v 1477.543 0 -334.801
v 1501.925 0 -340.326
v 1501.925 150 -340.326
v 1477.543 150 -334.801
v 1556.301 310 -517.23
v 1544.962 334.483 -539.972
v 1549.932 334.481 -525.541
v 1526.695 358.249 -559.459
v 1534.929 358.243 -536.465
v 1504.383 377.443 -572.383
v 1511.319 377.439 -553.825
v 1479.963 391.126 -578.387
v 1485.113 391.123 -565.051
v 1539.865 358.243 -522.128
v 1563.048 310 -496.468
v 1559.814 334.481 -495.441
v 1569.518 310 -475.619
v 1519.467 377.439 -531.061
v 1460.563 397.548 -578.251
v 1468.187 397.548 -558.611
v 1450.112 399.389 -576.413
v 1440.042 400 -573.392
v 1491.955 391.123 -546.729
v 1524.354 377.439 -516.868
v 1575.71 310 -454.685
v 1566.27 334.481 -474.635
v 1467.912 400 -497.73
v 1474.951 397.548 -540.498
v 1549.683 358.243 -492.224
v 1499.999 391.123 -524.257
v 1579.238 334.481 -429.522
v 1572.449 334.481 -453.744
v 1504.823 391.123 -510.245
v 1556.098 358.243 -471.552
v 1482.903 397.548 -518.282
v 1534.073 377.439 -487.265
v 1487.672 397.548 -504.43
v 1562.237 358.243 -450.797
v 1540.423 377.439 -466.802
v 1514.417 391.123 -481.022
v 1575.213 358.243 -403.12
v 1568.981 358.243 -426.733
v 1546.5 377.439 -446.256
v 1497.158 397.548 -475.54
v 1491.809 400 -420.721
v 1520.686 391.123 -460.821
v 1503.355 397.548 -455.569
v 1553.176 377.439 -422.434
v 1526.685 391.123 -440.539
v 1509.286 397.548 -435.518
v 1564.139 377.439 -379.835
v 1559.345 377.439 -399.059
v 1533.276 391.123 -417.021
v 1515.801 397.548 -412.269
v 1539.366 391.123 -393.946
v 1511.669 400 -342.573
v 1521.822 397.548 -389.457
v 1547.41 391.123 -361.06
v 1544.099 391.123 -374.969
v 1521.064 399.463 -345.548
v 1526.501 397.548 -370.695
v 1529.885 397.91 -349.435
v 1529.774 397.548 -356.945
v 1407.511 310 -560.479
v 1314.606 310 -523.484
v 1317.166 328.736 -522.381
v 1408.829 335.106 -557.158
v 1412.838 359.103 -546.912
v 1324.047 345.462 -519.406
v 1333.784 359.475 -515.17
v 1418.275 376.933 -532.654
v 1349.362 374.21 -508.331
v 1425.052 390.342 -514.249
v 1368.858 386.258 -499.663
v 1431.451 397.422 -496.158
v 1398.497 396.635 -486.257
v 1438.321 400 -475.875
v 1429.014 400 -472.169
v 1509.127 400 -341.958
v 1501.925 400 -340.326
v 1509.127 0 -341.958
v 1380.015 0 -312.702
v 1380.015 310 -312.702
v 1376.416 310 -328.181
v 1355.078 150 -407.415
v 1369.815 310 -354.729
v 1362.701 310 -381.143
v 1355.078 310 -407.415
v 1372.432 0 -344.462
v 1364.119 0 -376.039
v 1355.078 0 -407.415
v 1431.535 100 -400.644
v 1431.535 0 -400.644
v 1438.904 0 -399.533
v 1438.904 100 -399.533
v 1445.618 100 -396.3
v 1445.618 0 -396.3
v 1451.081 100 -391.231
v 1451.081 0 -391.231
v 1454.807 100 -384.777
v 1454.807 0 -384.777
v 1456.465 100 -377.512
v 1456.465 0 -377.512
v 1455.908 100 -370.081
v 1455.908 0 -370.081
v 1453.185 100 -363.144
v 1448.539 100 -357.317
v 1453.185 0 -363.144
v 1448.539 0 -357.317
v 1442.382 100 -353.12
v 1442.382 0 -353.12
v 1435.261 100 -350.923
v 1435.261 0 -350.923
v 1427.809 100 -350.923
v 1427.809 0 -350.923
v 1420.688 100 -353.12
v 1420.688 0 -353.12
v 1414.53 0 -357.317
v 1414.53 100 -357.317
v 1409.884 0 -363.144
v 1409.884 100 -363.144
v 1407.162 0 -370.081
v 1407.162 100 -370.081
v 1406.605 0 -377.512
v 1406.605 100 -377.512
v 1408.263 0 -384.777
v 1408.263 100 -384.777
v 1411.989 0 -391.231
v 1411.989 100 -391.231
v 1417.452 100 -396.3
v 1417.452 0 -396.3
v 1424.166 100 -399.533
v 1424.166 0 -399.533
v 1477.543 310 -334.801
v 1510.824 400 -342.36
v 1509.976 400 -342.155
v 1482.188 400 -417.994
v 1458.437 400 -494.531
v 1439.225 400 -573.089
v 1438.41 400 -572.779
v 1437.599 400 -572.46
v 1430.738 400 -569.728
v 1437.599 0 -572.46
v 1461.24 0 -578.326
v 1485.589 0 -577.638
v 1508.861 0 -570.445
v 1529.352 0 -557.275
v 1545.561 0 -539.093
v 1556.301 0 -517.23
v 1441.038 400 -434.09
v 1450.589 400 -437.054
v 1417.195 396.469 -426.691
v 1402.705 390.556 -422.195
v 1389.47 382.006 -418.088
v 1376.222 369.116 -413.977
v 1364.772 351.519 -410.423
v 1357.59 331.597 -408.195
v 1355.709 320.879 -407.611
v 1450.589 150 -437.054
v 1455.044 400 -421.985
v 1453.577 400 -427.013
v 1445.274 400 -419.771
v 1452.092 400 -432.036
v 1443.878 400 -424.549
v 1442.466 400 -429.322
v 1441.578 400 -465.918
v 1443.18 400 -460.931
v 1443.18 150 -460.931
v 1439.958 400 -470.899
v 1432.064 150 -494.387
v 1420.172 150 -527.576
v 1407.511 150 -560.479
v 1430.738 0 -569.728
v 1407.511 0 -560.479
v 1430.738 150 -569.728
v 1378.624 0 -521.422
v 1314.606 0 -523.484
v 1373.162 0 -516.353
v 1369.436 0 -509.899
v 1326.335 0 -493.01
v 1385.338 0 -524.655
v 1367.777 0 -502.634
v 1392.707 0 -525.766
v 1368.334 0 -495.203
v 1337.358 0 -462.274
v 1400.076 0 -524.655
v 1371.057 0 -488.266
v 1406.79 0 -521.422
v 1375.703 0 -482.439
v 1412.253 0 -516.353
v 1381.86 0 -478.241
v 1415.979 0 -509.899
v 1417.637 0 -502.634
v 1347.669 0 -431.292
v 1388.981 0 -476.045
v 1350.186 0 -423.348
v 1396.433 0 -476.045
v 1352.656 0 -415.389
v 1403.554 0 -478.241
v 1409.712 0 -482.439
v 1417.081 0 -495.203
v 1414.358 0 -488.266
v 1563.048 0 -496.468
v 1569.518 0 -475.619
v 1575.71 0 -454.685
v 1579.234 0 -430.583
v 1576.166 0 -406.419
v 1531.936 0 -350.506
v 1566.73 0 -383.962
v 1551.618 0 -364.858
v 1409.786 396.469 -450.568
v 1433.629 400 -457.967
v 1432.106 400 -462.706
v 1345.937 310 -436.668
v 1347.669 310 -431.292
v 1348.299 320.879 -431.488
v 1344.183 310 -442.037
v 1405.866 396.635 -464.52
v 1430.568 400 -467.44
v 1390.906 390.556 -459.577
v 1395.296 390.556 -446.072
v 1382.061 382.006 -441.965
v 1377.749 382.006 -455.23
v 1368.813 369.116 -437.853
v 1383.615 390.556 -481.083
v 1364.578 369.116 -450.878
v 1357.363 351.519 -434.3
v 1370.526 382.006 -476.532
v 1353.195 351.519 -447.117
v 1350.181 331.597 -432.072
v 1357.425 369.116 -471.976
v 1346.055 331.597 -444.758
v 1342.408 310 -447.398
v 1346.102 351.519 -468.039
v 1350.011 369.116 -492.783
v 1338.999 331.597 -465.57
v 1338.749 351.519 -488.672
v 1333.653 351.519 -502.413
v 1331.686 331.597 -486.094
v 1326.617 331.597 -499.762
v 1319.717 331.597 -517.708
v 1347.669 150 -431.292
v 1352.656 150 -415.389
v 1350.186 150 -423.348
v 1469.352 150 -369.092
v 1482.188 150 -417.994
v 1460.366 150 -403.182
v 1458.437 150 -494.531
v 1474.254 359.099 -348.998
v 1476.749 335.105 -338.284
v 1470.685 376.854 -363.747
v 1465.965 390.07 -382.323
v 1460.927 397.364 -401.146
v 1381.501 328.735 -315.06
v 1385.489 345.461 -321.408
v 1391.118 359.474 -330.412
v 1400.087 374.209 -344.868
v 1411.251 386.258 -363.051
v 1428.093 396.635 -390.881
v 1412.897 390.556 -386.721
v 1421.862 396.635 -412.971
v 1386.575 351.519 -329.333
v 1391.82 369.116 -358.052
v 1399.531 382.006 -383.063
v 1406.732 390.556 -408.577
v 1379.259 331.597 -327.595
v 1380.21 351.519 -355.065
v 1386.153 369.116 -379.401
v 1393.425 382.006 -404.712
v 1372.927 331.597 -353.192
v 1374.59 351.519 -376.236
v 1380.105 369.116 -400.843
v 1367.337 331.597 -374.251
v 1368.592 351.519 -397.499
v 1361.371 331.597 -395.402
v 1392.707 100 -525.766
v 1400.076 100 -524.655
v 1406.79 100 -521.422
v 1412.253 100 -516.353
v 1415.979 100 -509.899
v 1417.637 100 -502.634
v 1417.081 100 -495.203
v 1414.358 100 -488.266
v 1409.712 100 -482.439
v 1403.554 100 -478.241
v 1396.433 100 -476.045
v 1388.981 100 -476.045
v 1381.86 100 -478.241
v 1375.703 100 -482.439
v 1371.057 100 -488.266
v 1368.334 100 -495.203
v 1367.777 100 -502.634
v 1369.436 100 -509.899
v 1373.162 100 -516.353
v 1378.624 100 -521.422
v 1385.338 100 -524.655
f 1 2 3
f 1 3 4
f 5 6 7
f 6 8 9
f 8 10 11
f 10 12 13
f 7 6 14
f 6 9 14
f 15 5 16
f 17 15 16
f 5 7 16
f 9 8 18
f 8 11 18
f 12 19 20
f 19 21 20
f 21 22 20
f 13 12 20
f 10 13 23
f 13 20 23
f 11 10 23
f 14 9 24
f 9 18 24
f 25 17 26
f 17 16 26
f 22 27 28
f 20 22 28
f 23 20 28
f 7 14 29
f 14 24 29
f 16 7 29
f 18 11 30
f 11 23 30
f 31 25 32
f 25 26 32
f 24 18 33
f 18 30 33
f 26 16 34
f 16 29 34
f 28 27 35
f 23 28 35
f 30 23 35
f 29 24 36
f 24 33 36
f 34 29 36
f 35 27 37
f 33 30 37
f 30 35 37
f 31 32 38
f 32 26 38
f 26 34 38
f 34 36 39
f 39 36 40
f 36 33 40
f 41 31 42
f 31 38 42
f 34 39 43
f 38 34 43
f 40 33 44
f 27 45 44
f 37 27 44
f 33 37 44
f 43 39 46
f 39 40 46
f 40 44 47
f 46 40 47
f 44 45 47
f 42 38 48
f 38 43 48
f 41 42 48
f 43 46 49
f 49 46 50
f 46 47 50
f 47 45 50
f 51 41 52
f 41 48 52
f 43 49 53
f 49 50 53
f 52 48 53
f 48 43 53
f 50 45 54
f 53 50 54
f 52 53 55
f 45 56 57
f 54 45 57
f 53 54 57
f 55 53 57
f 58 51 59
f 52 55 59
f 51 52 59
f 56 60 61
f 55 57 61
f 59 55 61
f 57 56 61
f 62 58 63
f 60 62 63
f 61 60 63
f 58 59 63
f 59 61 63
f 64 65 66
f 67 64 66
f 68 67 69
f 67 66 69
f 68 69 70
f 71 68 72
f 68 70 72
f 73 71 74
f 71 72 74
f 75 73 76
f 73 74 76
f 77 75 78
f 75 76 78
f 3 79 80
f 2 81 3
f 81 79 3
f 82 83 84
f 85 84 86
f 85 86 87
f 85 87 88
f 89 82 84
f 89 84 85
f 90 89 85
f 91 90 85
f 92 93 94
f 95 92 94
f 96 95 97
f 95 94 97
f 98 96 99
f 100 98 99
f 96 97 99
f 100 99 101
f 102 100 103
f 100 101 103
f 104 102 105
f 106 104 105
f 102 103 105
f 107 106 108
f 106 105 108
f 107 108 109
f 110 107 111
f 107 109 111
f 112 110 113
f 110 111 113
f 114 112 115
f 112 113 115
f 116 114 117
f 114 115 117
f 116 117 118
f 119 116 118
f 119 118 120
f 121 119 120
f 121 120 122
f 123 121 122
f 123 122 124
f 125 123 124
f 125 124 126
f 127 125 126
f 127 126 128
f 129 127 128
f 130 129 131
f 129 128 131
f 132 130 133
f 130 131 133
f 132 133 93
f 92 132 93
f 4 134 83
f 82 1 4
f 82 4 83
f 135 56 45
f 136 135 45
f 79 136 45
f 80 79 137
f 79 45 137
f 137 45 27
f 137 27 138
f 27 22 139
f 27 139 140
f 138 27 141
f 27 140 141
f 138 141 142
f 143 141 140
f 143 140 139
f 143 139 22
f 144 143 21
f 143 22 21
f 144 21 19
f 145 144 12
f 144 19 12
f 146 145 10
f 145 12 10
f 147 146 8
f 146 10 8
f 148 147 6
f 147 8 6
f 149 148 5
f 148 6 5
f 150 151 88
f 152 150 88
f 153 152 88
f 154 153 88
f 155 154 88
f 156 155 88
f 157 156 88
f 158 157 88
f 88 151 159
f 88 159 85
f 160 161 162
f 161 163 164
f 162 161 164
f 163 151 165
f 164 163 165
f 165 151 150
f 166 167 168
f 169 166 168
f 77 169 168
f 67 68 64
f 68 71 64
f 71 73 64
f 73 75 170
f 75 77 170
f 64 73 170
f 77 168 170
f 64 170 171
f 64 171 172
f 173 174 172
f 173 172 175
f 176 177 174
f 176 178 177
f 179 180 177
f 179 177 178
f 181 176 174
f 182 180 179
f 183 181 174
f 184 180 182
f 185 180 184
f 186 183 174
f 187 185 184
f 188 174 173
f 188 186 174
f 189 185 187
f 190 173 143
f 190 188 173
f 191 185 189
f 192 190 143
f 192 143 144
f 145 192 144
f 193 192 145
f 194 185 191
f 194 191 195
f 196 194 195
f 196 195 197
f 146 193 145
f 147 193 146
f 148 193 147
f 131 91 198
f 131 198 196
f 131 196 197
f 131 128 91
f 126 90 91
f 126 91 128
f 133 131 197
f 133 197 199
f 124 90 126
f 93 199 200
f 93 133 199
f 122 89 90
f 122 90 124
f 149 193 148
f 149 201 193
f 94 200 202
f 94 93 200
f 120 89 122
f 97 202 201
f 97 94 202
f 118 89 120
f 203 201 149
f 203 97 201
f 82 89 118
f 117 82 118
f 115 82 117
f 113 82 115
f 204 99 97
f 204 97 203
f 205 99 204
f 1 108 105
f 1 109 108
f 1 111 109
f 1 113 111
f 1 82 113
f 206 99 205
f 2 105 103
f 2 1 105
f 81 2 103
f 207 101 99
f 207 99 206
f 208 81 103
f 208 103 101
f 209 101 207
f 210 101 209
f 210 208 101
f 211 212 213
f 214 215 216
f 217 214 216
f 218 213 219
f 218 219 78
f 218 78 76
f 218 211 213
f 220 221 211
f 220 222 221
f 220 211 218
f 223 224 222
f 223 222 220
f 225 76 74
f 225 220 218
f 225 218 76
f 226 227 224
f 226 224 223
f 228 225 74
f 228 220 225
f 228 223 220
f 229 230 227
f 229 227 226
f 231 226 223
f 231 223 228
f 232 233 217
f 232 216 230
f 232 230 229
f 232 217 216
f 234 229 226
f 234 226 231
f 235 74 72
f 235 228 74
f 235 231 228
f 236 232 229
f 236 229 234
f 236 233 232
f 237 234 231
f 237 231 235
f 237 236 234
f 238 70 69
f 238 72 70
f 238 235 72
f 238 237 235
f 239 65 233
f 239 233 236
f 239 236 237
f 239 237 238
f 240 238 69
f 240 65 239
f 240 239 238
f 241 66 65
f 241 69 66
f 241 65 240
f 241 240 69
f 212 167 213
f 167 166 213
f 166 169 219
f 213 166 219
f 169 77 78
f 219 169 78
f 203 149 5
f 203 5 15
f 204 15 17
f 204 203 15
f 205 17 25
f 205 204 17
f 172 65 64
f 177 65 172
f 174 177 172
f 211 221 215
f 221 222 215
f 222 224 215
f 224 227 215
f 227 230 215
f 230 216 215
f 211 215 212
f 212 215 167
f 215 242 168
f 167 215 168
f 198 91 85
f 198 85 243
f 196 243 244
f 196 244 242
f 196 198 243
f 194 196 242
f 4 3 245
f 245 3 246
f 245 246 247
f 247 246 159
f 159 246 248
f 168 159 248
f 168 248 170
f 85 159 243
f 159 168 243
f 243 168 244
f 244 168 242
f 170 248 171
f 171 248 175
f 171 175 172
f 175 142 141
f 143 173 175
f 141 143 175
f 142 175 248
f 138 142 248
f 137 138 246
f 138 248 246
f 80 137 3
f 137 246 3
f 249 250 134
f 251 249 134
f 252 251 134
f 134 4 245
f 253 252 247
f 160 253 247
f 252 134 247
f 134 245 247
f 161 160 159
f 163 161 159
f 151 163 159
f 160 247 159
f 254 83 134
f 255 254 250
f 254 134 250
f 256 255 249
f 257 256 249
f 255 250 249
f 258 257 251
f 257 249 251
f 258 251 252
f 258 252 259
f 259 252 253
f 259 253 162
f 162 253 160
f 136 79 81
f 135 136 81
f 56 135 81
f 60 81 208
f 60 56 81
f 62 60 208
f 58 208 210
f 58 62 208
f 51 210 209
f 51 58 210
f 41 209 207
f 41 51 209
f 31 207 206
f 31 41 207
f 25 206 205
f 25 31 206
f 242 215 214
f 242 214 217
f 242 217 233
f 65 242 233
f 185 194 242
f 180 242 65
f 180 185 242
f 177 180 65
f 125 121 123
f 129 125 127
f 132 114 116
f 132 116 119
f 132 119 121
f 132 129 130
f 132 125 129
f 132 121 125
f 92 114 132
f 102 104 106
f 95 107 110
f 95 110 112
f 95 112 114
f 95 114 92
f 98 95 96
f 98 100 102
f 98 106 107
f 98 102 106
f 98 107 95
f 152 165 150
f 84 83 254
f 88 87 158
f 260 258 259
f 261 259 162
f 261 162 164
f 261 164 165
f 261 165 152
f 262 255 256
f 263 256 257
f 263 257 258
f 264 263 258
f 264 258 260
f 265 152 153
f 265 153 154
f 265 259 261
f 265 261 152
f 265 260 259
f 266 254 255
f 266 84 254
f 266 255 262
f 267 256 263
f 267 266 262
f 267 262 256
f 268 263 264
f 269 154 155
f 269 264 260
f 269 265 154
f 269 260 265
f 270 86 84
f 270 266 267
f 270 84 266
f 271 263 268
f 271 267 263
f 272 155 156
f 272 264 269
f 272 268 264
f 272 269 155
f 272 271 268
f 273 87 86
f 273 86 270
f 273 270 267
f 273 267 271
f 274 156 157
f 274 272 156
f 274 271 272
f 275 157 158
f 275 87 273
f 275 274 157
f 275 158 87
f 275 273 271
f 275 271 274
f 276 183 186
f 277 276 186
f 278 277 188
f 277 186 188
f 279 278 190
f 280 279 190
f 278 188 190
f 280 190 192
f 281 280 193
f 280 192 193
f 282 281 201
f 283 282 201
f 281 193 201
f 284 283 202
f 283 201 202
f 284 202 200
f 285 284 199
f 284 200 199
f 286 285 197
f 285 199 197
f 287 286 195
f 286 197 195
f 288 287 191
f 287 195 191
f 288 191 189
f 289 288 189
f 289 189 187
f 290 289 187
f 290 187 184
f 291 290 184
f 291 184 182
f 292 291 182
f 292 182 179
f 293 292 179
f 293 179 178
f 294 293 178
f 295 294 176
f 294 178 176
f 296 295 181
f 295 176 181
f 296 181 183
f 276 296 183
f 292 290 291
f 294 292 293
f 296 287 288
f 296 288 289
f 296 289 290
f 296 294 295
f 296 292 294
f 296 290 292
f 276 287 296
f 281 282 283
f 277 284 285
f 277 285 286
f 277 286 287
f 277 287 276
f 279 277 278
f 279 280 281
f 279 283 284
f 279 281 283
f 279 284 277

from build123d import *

# Parameters (mm, degrees)
EXTRUDE_1_DEPTH     = 400
CUT_EXTRUDE_START   = -250
CUT_EXTRUDE_1_DEPTH = 250
SKETCH_3_R          = 15.665420251
SKETCH_3_R_2        = 18.510518013
CUT_EXTRUDE_2_DEPTH = 50
FILLET_2_R          = 90
FILLET_3_R          = 90
EXTRUDE_START       = 50
SKETCH_4_R          = 18.510518013
SKETCH_4_R_2        = 15.665420251
EXTRUDE_2_DEPTH     = 50
SKETCH_8_R          = 25
CUT_EXTRUDE_3_DEPTH = 100


with BuildPart() as part:
    # 草图1 → 凸台-拉伸1 (new body)
    with BuildSketch(Plane(origin=(0, 0, 0), x_dir=(1, 0, 0), z_dir=(0, 1, 0))):
        with BuildLine():
            ThreePointArc((1355.07847299, 407.415429308), (1351.426521797, 419.370189907), (1347.669105677, 431.292222979))
            ThreePointArc((1347.669105677, 431.292222979), (1331.935587475, 477.674147112), (1314.606303382, 523.483779222))
            Line((1314.606303382, 523.483779222), (1407.51134249, 560.479099308))
            Line((1407.51134249, 560.479099308), (1430.737602267, 569.72792933))
            Line((1430.737602267, 569.72792933), (1523.642641375, 606.723249416))
            ThreePointArc((1523.642641375, 606.723249416), (1566.317664839, 486.054495722), (1599.452391748, 362.425228886))
            Line((1599.452391748, 362.425228886), (1501.924806885, 340.326129564))
            Line((1501.924806885, 340.326129564), (1477.542910669, 334.801354733))
            Line((1477.542910669, 334.801354733), (1380.015325807, 312.702255411))
            ThreePointArc((1380.015325807, 312.702255411), (1368.366605987, 360.27466136), (1355.07847299, 407.415429308))
        make_face()
    extrude(amount=EXTRUDE_1_DEPTH)

    # 草图2 → 切除-拉伸1 (cut)
    with BuildSketch(Plane(origin=(0, 400, 0), x_dir=(1, 0, 0), z_dir=(0, 1, 0)).offset(CUT_EXTRUDE_START)):
        with BuildLine():
            Line((1347.669105677, 431.292222979), (1443.179761176, 460.930772385))
            ThreePointArc((1443.179761176, 460.930772385), (1426.214363088, 511.016233129), (1407.51134249, 560.479099308))
            Line((1407.51134249, 560.479099308), (1430.737602267, 569.72792933))
            ThreePointArc((1430.737602267, 569.72792933), (1470.810490154, 456.417026471), (1501.924806885, 340.326129564))
            Line((1501.924806885, 340.326129564), (1477.542910669, 334.801354733))
            ThreePointArc((1477.542910669, 334.801354733), (1464.958432674, 386.162906732), (1450.589128489, 437.053978714))
            Line((1450.589128489, 437.053978714), (1355.07847299, 407.415429308))
            ThreePointArc((1355.07847299, 407.415429308), (1351.426521797, 419.370189907), (1347.669105677, 431.292222979))
        make_face()
    extrude(amount=CUT_EXTRUDE_1_DEPTH, mode=Mode.SUBTRACT)

    # 草图3 → 切除-拉伸2 (cut)
    with BuildSketch(Plane.XZ):
        with Locations(Location((1537.673756185, -404.548414334, 0), (0, 0, 270))):
            Circle(SKETCH_3_R)
        with Locations(Location((1496.563725778, -537.026083805, 0), (0, 0, 270))):
            Circle(SKETCH_3_R_2)
    extrude(amount=-CUT_EXTRUDE_2_DEPTH, mode=Mode.SUBTRACT)

    # 圆角2
    fillet_2_edges = [part.edges().sort_by_distance(p)[0] for p in [
        (1523.642641375, 200, -606.723249416),
        (1599.452391748, 200, -362.425228886),
        (1566.317664839, 400, -486.054495722),
    ]]
    fillet(fillet_2_edges, radius=FILLET_2_R)

    # 圆角3
    # the kernel refuses this fillet: 90 mm, written as the material it takes off along each edge
    with BuildSketch(Plane(origin=(0, 400, 0), x_dir=(0.9886635459067241, 0, -0.15014790373209708), z_dir=(0.15014790373209708, 0, 0.9886635459067241))) as fillet_3_piece_1_section:
        with BuildLine():
            CenterArc((1415 + FILLET_3_R, -FILLET_3_R), FILLET_3_R, 90, 90)
            Line((1415 + FILLET_3_R, 0), (1415 + FILLET_3_R, FILLET_3_R * 0.02))
            Line((1415 + FILLET_3_R, FILLET_3_R * 0.02), (1415 - FILLET_3_R * 0.02, FILLET_3_R * 0.02))
            Line((1415 - FILLET_3_R * 0.02, FILLET_3_R * 0.02), (1415 - FILLET_3_R * 0.02, -FILLET_3_R))
            Line((1415 - FILLET_3_R * 0.02, -FILLET_3_R), (1415, -FILLET_3_R))
        make_face()
    fillet_3_piece_1 = revolve(axis=Axis((0, 400, 0), (0, 1, 0)), revolution_arc=13.077233198, mode=Mode.PRIVATE)
    fillet_3_piece_1 = split(fillet_3_piece_1, bisect_by=Plane(origin=(1365.899074688, 379.798837266, -436.949286418), z_dir=(-0.2963746925135586, 0, -0.9550717468533417)), keep=Keep.TOP, mode=Mode.PRIVATE)
    add(fillet_3_piece_1, mode=Mode.SUBTRACT)
    with BuildSketch(Plane(origin=(1696.97997661, 400, -384.524328208), x_dir=(0, -1, 0), z_dir=(-0.9752758486265656, 0, 0.22099099322310048))) as fillet_3_piece_2_section:
        with BuildLine():
            CenterArc((FILLET_3_R, -FILLET_3_R), FILLET_3_R, 90, 90)
            Line((0, -FILLET_3_R), (-FILLET_3_R * 0.02, -FILLET_3_R))
            Line((-FILLET_3_R * 0.02, -FILLET_3_R), (-FILLET_3_R * 0.02, FILLET_3_R * 0.02))
            Line((-FILLET_3_R * 0.02, FILLET_3_R * 0.02), (FILLET_3_R, FILLET_3_R * 0.02))
            Line((FILLET_3_R, FILLET_3_R * 0.02), (FILLET_3_R, 0))
        make_face()
    fillet_3_piece_2 = extrude(amount=550, mode=Mode.PRIVATE)
    fillet_3_piece_2 = fillet_3_piece_2 - Plane(origin=(0, 379.627251668, 0), x_dir=(0.9752758486265642, 0, -0.22099099322310606), z_dir=(0, -1, 0)) * Cylinder(1415, 1461, mode=Mode.PRIVATE)
    fillet_3_piece_2 = fillet_3_piece_2 & Plane(origin=(0, 379.627251668, 0), x_dir=(0.9752758486265641, 0, -0.22099099322310678), z_dir=(0, -1, 0)) * Cylinder(1515, 1461, mode=Mode.PRIVATE)
    add(fillet_3_piece_2, mode=Mode.SUBTRACT)
    with BuildSketch(Plane(origin=(1105.569965388, 400, -440.244309028), x_dir=(0, -1, 0), z_dir=(0.9290503910825915, 0, -0.36995320086368216))) as fillet_3_piece_3_section:
        with BuildLine():
            CenterArc((FILLET_3_R, -FILLET_3_R), FILLET_3_R, 90, 90)
            Line((0, -FILLET_3_R), (-FILLET_3_R * 0.02, -FILLET_3_R))
            Line((-FILLET_3_R * 0.02, -FILLET_3_R), (-FILLET_3_R * 0.02, FILLET_3_R * 0.02))
            Line((-FILLET_3_R * 0.02, FILLET_3_R * 0.02), (FILLET_3_R, FILLET_3_R * 0.02))
            Line((FILLET_3_R, FILLET_3_R * 0.02), (FILLET_3_R, 0))
        make_face()
    fillet_3_piece_3 = extrude(amount=550, mode=Mode.PRIVATE)
    fillet_3_piece_3 = fillet_3_piece_3 - Plane(origin=(0, 379.627145312, 0), x_dir=(0.9752758486265642, 0, -0.22099099322310606), z_dir=(0, -1, 0)) * Cylinder(1415, 1461, mode=Mode.PRIVATE)
    fillet_3_piece_3 = fillet_3_piece_3 & Plane(origin=(0, 379.627145312, 0), x_dir=(0.9525939017664254, 0, -0.30424473424764115), z_dir=(0, -1, 0)) * Cylinder(1515, 1461, mode=Mode.PRIVATE)
    add(fillet_3_piece_3, mode=Mode.SUBTRACT)
    with BuildSketch(Plane(origin=(0, 400, 0), x_dir=(0.9752758486265642, 0, -0.22099099322310606), z_dir=(0.22099099322310606, 0, 0.9752758486265642))) as fillet_3_piece_4_section:
        with BuildLine():
            CenterArc((1415 + FILLET_3_R, -FILLET_3_R), FILLET_3_R, 90, 90)
            Line((1415 + FILLET_3_R, 0), (1415 + FILLET_3_R, FILLET_3_R * 0.02))
            Line((1415 + FILLET_3_R, FILLET_3_R * 0.02), (1415 - FILLET_3_R * 0.02, FILLET_3_R * 0.02))
            Line((1415 - FILLET_3_R * 0.02, FILLET_3_R * 0.02), (1415 - FILLET_3_R * 0.02, -FILLET_3_R))
            Line((1415 - FILLET_3_R * 0.02, -FILLET_3_R), (1415, -FILLET_3_R))
        make_face()
    fillet_3_piece_4 = revolve(axis=Axis((0, 400, 0), (0, 1, 0)), revolution_arc=13.077233198, mode=Mode.PRIVATE)
    fillet_3_piece_4 = split(fillet_3_piece_4, bisect_by=Plane(origin=(1373.308440607, 379.798836933, -413.072492314), z_dir=(0.29637469251355963, 0, 0.9550717468533415)), keep=Keep.TOP, mode=Mode.PRIVATE)
    add(fillet_3_piece_4, mode=Mode.SUBTRACT)
    with BuildSketch(Plane(origin=(0, 400, 0), x_dir=(0.9886635459067241, 0, -0.15014790373209708), z_dir=(0.15014790373209708, 0, 0.9886635459067241))) as fillet_3_piece_5a_section:
        with BuildLine():
            CenterArc((1415 + FILLET_3_R, -FILLET_3_R), FILLET_3_R, 90, 90)
            Line((1415 + FILLET_3_R, 0), (1415 + FILLET_3_R, FILLET_3_R * 0.02))
            Line((1415 + FILLET_3_R, FILLET_3_R * 0.02), (1415 - FILLET_3_R * 0.02, FILLET_3_R * 0.02))
            Line((1415 - FILLET_3_R * 0.02, FILLET_3_R * 0.02), (1415 - FILLET_3_R * 0.02, -FILLET_3_R))
            Line((1415 - FILLET_3_R * 0.02, -FILLET_3_R), (1415, -FILLET_3_R))
        make_face()
    fillet_3_piece_5a = revolve(axis=Axis((0, 400, 0), (0, 1, 0)), revolution_arc=22.187876624, mode=Mode.PRIVATE)
    fillet_3_piece_5a = split(fillet_3_piece_5a, bisect_by=Plane(origin=(1328.166352614, 379.779381403, -528.883468696), z_dir=(-0.3699532008636821, 0, -0.9290503910825915)), keep=Keep.TOP, mode=Mode.PRIVATE)
    with BuildSketch(Plane(origin=(1105.569965388, 400, -440.244309028), x_dir=(0, -1, 0), z_dir=(0.9290503910825915, 0, -0.36995320086368216))) as fillet_3_piece_5b_section:
        with BuildLine():
            CenterArc((FILLET_3_R, -FILLET_3_R), FILLET_3_R, 90, 90)
            Line((0, -FILLET_3_R), (-FILLET_3_R * 0.02, -FILLET_3_R))
            Line((-FILLET_3_R * 0.02, -FILLET_3_R), (-FILLET_3_R * 0.02, FILLET_3_R * 0.02))
            Line((-FILLET_3_R * 0.02, FILLET_3_R * 0.02), (FILLET_3_R, FILLET_3_R * 0.02))
            Line((FILLET_3_R, FILLET_3_R * 0.02), (FILLET_3_R, 0))
        make_face()
    fillet_3_piece_5b = extrude(amount=550, mode=Mode.PRIVATE)
    fillet_3_piece_5b = fillet_3_piece_5b & Plane(origin=(0, 379.605879508, 0), x_dir=(0.9752758486265642, 0, -0.22099099322310606), z_dir=(0, -1, 0)) * Cylinder(1415, 1461, mode=Mode.PRIVATE)
    fillet_3_piece_5 = fillet_3_piece_5a & fillet_3_piece_5b
    add(fillet_3_piece_5, mode=Mode.SUBTRACT)
    with BuildSketch(Plane(origin=(1696.97997661, 400, -384.524328208), x_dir=(0, -1, 0), z_dir=(-0.9752758486265656, 0, 0.22099099322310048))) as fillet_3_piece_6a_section:
        with BuildLine():
            CenterArc((FILLET_3_R, -FILLET_3_R), FILLET_3_R, 90, 90)
            Line((0, -FILLET_3_R), (-FILLET_3_R * 0.02, -FILLET_3_R))
            Line((-FILLET_3_R * 0.02, -FILLET_3_R), (-FILLET_3_R * 0.02, FILLET_3_R * 0.02))
            Line((-FILLET_3_R * 0.02, FILLET_3_R * 0.02), (FILLET_3_R, FILLET_3_R * 0.02))
            Line((FILLET_3_R, FILLET_3_R * 0.02), (FILLET_3_R, 0))
        make_face()
    fillet_3_piece_6a = extrude(amount=550, mode=Mode.PRIVATE)
    fillet_3_piece_6a = fillet_3_piece_6a & Plane(origin=(0, 379.60590325, 0), x_dir=(0.9752758486265642, 0, -0.22099099322310606), z_dir=(0, -1, 0)) * Cylinder(1415, 1461, mode=Mode.PRIVATE)
    with BuildSketch(Plane(origin=(0, 400, 0), x_dir=(0.9979642112015443, 0, -0.06377643107668678), z_dir=(0.06377643107668678, 0, 0.9979642112015443))) as fillet_3_piece_6b_section:
        with BuildLine():
            CenterArc((1415 + FILLET_3_R, -FILLET_3_R), FILLET_3_R, 90, 90)
            Line((1415 + FILLET_3_R, 0), (1415 + FILLET_3_R, FILLET_3_R * 0.02))
            Line((1415 + FILLET_3_R, FILLET_3_R * 0.02), (1415 - FILLET_3_R * 0.02, FILLET_3_R * 0.02))
            Line((1415 - FILLET_3_R * 0.02, FILLET_3_R * 0.02), (1415 - FILLET_3_R * 0.02, -FILLET_3_R))
            Line((1415 - FILLET_3_R * 0.02, -FILLET_3_R), (1415, -FILLET_3_R))
        make_face()
    fillet_3_piece_6b = revolve(axis=Axis((0, 400, 0), (0, 1, 0)), revolution_arc=22.187876624, mode=Mode.PRIVATE)
    fillet_3_piece_6b = split(fillet_3_piece_6b, bisect_by=Plane(origin=(1394.250064092, 379.779381346, -315.927752029), z_dir=(0.22099099322310004, 0, 0.9752758486265657)), keep=Keep.TOP, mode=Mode.PRIVATE)
    fillet_3_piece_6 = fillet_3_piece_6a & fillet_3_piece_6b
    add(fillet_3_piece_6, mode=Mode.SUBTRACT)

    # 草图4 → 凸台-拉伸2 (add)
    with BuildSketch(Plane.XZ.offset(-50).offset(EXTRUDE_START)):
        with Locations((1496.563725778, -537.026083805)):
            Circle(SKETCH_4_R)
        with Locations((1537.673756185, -404.548414334)):
            Circle(SKETCH_4_R_2)
    extrude(amount=-EXTRUDE_2_DEPTH)

    # 草图8 → 切除-拉伸3 (cut)
    with BuildSketch(Plane.XZ):
        with Locations(Location((1431.534758427, -375.643761315, 0), (0, 0, 270))):
            Circle(SKETCH_8_R)
        with Locations(Location((1392.707343884, -500.765668043, 0), (0, 0, 270))):
            Circle(SKETCH_8_R)
    extrude(amount=-CUT_EXTRUDE_3_DEPTH, mode=Mode.SUBTRACT)


solid = part.part
